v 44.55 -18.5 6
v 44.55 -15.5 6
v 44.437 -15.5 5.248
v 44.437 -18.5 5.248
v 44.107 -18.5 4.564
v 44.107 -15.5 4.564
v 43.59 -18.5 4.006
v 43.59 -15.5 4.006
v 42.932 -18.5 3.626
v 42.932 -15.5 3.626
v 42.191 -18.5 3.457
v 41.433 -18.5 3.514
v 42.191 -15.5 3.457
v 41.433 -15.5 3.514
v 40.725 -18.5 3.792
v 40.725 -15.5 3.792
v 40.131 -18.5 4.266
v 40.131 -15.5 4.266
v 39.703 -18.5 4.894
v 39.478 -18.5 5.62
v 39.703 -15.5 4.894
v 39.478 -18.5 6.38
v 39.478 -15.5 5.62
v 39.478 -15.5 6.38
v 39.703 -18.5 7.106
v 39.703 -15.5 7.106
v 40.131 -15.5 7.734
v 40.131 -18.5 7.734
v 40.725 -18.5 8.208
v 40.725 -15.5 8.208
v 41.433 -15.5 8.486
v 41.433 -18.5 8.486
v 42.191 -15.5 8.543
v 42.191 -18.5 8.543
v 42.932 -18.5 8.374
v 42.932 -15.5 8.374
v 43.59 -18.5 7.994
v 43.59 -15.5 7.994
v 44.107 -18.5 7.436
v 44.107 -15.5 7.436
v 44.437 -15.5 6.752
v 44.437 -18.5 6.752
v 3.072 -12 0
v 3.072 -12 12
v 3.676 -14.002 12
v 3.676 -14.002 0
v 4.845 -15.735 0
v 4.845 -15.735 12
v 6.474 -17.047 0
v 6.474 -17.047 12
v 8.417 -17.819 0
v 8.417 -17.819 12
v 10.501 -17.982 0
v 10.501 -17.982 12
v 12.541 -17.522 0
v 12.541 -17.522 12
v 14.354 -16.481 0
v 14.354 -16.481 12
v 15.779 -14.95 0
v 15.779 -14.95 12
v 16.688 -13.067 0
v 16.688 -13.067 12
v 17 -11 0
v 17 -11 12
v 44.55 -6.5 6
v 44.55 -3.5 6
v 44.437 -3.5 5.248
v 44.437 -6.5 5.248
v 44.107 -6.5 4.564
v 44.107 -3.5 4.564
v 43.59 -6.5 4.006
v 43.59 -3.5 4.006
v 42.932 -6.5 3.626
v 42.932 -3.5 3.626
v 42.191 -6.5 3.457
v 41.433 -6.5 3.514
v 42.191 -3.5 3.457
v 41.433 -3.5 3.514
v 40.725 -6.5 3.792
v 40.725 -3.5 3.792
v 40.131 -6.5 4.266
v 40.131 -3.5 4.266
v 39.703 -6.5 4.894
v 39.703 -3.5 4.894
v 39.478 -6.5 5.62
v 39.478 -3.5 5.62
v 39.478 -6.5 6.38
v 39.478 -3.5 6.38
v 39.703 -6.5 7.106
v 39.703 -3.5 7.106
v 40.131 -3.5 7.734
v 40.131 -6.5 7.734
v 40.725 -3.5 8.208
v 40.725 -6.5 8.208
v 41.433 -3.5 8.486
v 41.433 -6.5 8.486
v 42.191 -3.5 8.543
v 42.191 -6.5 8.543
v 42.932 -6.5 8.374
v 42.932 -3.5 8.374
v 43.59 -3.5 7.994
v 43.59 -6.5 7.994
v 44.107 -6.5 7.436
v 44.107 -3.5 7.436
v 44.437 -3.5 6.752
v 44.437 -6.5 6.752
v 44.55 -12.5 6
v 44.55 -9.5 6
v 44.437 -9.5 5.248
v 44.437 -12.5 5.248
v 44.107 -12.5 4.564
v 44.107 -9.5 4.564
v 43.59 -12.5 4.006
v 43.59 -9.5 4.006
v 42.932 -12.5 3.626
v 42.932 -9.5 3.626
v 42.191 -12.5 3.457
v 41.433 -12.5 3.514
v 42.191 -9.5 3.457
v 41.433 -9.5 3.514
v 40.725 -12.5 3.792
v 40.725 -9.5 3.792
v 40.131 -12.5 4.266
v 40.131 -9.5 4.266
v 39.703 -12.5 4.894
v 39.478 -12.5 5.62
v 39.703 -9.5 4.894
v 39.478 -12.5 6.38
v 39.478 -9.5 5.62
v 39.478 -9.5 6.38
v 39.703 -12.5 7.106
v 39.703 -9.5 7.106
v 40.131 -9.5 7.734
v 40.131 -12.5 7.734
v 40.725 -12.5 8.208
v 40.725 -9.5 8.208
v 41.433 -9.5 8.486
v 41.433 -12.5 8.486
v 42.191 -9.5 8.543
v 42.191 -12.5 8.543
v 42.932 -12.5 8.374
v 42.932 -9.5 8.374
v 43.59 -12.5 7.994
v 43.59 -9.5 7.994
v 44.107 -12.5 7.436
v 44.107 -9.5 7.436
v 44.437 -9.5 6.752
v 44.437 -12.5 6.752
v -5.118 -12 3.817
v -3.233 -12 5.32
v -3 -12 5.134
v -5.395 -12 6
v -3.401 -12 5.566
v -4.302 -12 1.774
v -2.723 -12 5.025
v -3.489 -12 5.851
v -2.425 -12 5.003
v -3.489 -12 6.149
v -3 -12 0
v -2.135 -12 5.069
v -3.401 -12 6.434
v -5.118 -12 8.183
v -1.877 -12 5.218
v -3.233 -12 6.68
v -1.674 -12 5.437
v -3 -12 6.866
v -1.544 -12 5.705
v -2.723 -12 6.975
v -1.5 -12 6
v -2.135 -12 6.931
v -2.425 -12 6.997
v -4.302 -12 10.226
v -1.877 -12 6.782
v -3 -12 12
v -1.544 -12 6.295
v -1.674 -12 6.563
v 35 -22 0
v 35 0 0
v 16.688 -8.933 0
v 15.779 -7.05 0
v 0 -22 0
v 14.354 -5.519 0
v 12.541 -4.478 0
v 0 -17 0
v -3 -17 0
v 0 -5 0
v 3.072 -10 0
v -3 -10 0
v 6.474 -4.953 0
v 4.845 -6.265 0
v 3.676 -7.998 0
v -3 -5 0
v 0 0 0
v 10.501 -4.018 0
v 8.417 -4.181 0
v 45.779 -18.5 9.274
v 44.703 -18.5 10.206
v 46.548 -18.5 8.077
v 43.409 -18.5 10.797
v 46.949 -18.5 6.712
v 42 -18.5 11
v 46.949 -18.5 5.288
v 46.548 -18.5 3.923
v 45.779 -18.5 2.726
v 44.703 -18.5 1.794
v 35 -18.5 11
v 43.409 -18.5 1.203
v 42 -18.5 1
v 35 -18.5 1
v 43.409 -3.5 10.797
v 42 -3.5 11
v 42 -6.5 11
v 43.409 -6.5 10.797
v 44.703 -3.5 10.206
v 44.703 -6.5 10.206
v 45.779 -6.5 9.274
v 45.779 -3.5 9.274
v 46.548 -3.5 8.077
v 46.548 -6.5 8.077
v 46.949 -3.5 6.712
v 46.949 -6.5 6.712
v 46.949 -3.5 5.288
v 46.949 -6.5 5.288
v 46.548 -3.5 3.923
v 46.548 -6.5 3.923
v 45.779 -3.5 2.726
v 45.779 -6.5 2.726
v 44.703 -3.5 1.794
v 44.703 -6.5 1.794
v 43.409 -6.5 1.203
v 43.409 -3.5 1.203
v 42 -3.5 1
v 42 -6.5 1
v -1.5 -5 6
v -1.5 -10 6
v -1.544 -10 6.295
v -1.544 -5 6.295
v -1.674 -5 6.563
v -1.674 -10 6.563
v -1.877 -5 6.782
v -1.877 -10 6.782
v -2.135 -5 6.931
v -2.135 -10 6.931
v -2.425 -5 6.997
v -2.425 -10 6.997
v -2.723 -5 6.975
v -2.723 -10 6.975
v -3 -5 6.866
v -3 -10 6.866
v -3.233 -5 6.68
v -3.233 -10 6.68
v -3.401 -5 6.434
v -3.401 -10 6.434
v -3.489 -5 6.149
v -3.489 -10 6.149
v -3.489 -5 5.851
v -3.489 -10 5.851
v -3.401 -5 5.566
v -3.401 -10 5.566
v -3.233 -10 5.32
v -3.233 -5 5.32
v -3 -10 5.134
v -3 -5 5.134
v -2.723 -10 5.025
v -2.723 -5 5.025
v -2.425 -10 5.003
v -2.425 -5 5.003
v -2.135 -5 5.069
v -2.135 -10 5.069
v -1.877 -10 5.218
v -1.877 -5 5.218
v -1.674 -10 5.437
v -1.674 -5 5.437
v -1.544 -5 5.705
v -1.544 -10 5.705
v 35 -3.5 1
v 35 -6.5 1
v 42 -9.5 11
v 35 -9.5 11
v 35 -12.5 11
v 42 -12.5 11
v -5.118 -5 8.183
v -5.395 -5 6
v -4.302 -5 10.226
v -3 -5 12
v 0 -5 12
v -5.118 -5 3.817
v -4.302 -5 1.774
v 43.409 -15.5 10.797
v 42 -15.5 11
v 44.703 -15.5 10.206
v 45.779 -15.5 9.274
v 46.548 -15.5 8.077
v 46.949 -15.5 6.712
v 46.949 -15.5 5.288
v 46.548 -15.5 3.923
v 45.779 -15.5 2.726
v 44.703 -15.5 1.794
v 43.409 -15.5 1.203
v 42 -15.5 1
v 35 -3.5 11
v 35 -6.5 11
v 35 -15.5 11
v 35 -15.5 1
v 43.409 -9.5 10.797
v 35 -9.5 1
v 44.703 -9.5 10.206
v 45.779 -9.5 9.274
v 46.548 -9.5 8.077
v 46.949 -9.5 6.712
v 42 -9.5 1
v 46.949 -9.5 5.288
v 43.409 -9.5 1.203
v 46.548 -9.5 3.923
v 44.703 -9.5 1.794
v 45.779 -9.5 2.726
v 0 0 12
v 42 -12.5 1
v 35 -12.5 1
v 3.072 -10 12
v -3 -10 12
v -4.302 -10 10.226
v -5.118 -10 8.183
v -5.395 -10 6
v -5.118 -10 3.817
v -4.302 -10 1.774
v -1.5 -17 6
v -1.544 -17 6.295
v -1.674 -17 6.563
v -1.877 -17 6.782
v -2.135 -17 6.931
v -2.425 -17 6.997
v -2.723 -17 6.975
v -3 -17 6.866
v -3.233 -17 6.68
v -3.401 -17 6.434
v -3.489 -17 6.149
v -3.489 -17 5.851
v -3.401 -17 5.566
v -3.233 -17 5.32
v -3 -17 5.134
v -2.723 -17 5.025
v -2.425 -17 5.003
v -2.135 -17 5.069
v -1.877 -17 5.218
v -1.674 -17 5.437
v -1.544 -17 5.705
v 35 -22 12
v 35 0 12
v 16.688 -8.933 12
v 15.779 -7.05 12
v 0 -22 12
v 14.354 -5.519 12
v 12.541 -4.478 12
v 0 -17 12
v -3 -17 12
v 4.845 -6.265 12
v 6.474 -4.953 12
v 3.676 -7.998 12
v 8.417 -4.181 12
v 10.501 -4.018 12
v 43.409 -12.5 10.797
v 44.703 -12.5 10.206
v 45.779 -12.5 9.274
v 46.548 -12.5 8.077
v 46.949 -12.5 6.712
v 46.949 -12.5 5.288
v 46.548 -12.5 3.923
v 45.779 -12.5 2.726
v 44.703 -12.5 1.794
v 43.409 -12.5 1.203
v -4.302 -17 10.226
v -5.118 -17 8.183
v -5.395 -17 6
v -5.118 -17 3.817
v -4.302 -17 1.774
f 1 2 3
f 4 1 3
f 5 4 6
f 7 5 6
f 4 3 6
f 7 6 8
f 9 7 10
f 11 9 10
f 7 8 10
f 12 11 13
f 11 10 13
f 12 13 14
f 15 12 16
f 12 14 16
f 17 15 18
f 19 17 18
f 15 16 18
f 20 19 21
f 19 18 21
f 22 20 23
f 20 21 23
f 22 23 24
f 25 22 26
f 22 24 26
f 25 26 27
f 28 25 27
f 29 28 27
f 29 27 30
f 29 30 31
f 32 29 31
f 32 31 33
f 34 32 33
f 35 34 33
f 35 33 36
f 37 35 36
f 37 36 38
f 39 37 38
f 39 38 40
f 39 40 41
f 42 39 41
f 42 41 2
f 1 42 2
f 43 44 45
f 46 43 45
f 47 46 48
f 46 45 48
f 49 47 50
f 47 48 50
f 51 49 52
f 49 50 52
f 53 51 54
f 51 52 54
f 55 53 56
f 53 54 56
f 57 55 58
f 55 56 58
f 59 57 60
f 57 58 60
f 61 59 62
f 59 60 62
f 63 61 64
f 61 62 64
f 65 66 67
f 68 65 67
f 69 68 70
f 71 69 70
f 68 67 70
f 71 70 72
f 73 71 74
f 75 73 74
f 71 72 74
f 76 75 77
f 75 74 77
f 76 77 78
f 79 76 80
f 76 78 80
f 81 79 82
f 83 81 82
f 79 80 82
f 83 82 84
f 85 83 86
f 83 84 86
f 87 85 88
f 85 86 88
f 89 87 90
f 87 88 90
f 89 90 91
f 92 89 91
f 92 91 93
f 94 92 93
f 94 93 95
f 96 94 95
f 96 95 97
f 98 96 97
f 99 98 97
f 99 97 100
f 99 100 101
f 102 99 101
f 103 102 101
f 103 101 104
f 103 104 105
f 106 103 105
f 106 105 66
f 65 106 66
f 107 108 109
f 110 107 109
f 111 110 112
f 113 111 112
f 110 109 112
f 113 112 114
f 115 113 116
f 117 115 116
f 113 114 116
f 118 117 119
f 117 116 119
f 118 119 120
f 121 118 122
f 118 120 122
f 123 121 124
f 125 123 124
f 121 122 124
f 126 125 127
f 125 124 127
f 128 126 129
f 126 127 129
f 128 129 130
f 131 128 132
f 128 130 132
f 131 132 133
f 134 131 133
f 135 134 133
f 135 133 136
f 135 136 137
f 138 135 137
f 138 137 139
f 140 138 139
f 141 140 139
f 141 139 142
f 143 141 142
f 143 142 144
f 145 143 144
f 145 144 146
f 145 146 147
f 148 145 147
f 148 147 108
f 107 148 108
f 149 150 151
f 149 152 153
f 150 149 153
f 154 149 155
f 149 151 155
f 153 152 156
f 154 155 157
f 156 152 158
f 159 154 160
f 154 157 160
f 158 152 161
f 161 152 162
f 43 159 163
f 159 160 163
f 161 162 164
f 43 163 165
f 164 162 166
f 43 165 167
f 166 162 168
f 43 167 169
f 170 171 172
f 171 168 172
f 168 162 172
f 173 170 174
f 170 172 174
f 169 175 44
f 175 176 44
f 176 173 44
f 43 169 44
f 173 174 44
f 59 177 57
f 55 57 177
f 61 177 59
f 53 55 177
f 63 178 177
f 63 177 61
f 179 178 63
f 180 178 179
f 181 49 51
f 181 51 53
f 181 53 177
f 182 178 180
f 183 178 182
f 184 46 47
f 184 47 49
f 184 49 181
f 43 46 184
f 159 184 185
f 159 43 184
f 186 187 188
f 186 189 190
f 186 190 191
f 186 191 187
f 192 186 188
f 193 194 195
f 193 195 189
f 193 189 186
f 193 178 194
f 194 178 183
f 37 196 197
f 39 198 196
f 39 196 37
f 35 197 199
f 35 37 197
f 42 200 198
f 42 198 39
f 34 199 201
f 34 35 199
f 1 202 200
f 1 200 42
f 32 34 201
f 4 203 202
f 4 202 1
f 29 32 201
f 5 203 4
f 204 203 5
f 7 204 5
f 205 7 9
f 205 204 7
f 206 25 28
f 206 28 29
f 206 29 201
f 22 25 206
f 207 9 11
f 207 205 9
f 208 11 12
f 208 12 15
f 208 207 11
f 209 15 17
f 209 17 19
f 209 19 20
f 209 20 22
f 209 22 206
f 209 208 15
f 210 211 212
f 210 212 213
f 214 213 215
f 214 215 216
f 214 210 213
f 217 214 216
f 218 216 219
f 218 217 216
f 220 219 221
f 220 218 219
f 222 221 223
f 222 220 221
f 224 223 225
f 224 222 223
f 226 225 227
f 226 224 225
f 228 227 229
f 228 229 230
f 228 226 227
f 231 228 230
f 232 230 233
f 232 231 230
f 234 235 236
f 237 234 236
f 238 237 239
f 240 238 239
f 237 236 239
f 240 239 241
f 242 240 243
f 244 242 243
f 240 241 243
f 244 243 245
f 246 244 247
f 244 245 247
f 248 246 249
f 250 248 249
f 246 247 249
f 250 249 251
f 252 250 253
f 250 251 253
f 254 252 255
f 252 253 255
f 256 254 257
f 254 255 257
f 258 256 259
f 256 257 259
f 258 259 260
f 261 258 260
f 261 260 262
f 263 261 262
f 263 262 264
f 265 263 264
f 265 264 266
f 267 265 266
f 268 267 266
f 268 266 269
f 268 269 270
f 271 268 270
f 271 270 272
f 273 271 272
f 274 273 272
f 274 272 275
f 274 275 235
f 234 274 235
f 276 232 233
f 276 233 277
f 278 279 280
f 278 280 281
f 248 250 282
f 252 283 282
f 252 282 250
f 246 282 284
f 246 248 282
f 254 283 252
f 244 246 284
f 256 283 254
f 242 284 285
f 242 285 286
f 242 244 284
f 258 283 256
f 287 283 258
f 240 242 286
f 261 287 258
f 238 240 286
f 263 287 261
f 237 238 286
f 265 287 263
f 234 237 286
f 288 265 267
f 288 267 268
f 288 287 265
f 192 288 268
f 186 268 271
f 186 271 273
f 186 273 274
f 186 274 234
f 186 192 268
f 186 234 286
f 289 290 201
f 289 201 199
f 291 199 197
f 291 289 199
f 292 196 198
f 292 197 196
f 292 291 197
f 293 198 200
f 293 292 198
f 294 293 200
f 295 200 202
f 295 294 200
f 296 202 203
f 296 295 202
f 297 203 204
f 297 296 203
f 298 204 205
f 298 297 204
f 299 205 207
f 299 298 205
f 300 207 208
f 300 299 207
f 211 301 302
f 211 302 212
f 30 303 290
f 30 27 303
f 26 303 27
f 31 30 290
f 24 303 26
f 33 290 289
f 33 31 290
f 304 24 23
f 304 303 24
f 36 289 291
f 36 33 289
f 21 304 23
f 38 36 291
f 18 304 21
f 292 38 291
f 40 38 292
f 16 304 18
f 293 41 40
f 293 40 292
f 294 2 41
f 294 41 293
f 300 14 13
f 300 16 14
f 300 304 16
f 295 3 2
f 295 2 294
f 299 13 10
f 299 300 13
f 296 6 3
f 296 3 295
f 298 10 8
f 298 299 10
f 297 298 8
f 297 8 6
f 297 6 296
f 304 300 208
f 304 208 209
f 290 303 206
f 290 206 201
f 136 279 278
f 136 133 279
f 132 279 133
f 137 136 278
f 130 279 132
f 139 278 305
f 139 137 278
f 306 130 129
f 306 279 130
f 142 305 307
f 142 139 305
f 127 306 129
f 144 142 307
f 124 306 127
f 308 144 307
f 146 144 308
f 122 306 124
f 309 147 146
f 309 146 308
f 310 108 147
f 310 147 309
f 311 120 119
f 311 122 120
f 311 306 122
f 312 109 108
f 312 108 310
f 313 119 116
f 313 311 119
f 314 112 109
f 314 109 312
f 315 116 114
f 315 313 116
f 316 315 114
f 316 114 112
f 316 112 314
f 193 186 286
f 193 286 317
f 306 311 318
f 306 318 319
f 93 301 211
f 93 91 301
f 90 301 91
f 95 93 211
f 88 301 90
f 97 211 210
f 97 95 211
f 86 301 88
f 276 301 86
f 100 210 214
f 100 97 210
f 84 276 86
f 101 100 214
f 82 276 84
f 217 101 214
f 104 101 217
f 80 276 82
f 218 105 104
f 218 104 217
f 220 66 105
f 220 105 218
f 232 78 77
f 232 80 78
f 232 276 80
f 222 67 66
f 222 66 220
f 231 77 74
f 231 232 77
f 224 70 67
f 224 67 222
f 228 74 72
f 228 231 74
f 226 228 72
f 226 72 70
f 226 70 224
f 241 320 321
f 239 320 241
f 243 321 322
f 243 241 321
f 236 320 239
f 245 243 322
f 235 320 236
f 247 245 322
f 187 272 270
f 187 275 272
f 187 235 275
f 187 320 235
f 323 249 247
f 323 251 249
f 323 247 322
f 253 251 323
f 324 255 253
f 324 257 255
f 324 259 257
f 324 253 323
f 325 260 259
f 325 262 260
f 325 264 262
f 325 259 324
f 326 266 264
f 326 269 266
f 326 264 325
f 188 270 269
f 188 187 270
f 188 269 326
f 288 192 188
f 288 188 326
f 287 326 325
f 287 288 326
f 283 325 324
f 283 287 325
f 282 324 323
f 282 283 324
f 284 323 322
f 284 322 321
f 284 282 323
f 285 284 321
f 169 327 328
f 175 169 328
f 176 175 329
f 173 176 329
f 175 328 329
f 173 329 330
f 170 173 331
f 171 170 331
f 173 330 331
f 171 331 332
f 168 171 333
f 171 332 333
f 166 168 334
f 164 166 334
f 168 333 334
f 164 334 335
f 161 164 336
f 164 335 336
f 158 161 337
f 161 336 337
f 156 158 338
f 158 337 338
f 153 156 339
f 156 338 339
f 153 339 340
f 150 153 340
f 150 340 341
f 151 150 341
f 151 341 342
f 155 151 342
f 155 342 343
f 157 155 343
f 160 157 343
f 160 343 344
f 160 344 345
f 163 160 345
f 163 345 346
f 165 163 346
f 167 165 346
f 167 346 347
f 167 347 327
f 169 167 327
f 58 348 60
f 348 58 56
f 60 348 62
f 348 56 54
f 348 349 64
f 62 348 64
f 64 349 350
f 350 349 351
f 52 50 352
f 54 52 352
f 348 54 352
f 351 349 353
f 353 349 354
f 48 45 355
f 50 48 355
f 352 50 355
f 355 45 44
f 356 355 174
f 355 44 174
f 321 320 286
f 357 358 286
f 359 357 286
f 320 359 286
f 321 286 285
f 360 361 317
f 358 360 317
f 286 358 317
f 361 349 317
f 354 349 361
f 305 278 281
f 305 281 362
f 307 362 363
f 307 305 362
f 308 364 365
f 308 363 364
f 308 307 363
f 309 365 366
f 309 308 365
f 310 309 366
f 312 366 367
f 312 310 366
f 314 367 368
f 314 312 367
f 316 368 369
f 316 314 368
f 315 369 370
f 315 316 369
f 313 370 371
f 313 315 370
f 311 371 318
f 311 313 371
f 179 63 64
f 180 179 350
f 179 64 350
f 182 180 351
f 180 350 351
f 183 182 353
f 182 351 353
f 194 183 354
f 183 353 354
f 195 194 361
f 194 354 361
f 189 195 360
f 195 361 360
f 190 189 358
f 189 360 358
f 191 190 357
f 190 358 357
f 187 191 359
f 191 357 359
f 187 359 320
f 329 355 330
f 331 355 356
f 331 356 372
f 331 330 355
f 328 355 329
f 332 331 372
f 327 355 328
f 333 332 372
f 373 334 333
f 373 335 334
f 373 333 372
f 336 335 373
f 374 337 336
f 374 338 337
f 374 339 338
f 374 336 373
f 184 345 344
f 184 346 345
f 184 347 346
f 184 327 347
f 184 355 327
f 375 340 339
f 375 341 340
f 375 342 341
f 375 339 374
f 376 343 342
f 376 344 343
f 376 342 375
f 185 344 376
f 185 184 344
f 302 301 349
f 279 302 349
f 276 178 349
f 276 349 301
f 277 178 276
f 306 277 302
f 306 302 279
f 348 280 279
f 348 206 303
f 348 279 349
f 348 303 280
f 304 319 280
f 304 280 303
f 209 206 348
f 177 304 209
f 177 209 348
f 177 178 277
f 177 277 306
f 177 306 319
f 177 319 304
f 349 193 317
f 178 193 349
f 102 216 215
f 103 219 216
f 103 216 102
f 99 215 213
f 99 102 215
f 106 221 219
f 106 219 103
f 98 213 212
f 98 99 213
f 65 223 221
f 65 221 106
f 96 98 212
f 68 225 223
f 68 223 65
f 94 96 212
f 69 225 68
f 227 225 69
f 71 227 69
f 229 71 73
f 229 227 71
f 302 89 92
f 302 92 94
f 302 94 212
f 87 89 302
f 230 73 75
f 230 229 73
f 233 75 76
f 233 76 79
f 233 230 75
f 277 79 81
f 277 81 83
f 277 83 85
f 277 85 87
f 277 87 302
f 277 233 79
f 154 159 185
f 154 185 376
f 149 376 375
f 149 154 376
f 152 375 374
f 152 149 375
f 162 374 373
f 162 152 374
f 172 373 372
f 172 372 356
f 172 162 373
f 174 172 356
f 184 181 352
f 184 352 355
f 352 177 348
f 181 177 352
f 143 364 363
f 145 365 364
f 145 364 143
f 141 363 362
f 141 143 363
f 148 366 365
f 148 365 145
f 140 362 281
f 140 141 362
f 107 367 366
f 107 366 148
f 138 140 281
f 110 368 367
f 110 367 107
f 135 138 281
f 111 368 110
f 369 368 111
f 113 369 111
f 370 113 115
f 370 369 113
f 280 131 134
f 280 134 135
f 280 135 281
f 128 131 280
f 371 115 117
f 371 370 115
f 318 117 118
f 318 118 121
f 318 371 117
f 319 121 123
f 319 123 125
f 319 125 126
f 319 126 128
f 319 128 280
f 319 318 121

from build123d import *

# Parameters (mm, degrees)
EXTRUDE_1_DEPTH     = 12
SKETCH_2_R          = 2.55
CUT_EXTRUDE_1_DEPTH = 19
CUT_EXTRUDE_2_DEPTH = 19
SKETCH_4_R          = 1
CUT_EXTRUDE_3_DEPTH = 19
SKETCH_5_W          = 10
SKETCH_5_H          = 2
CUT_EXTRUDE_4_DEPTH = 19
SKETCH_6_R          = 7
CUT_EXTRUDE_5_DEPTH = 19
CUT_EXTRUDE_6_DEPTH = 19


with BuildPart() as part:
    # 草图1 → 凸台-拉伸1 (new body)
    with BuildSketch(Plane.XY):
        Polygon((0, 0), (35, 0), (35, -3.5), (47, -3.5), (47, -6.5), (35, -6.5), (35, -9.5), (47, -9.5), (47, -12.5), (35, -12.5), (35, -15.5), (47, -15.5), (47, -18.5), (35, -18.5), (35, -22), (0, -22), (0, -17), (-10, -17), (-10, -12), (0, -12), (0, -10), (-10, -10), (-10, -5), (0, -5), align=None)
    extrude(amount=EXTRUDE_1_DEPTH)

    # 草图2 → 切除-拉伸1 (cut)
    with BuildSketch(Plane(origin=(0, -3.5, 0), x_dir=(1, 0, 0), z_dir=(0, 1, 0))):
        with Locations((42, -6)):
            Circle(SKETCH_2_R)
    extrude(amount=-CUT_EXTRUDE_1_DEPTH, mode=Mode.SUBTRACT)

    # 草图3 → 切除-拉伸2 (cut)
    with BuildSketch(Plane(origin=(0, -3.5, 0), x_dir=(1, 0, 0), z_dir=(0, 1, 0))):
        with BuildLine():
            Line((42, -1), (35, -1))
            Line((35, -1), (35, 1.362905895))
            Line((35, 1.362905895), (53.328864927, 1.362905895))
            Line((53.328864927, 1.362905895), (53.328864927, -14.813237877))
            Line((53.328864927, -14.813237877), (35, -14.813237877))
            Line((35, -14.813237877), (35, -11))
            Line((35, -11), (42, -11))
            ThreePointArc((42, -11), (47, -6), (42, -1))
        make_face()
    extrude(amount=-CUT_EXTRUDE_2_DEPTH, mode=Mode.SUBTRACT)

    # 草图4 → 切除-拉伸3 (cut)
    with BuildSketch(Plane.XZ.offset(17)):
        with Locations((-2.5, 6)):
            Circle(SKETCH_4_R)
    extrude(amount=-CUT_EXTRUDE_3_DEPTH, mode=Mode.SUBTRACT)

    # 草图5 → 切除-拉伸4 (cut)
    with BuildSketch(Plane.XY.offset(12)):
        with Locations((5, -11)):
            Rectangle(SKETCH_5_W, SKETCH_5_H)
    extrude(amount=-CUT_EXTRUDE_4_DEPTH, mode=Mode.SUBTRACT)

    # 草图6 → 切除-拉伸5 (cut)
    with BuildSketch(Plane.XY.offset(12)):
        with Locations((10, -11)):
            Circle(SKETCH_6_R)
    extrude(amount=-CUT_EXTRUDE_5_DEPTH, mode=Mode.SUBTRACT)

    # 草图7 → 切除-拉伸6 (cut)
    with BuildSketch(Plane(origin=(0, -5, 0), x_dir=(1, 0, 0), z_dir=(0, 1, 0))):
        with BuildLine():
            Line((-3, -12), (-3, -16.245470045))
            Line((-3, -16.245470045), (-15.241663488, -16.245470045))
            Line((-15.241663488, -16.245470045), (-15.241663488, 3.326156632))
            Line((-15.241663488, 3.326156632), (-3, 3.326156632))
            Line((-3, 3.326156632), (-3, 0))
            ThreePointArc((-3, 0), (-5.395390723, -6), (-3, -12))
        make_face()
    extrude(amount=-CUT_EXTRUDE_6_DEPTH, mode=Mode.SUBTRACT)


solid = part.part
